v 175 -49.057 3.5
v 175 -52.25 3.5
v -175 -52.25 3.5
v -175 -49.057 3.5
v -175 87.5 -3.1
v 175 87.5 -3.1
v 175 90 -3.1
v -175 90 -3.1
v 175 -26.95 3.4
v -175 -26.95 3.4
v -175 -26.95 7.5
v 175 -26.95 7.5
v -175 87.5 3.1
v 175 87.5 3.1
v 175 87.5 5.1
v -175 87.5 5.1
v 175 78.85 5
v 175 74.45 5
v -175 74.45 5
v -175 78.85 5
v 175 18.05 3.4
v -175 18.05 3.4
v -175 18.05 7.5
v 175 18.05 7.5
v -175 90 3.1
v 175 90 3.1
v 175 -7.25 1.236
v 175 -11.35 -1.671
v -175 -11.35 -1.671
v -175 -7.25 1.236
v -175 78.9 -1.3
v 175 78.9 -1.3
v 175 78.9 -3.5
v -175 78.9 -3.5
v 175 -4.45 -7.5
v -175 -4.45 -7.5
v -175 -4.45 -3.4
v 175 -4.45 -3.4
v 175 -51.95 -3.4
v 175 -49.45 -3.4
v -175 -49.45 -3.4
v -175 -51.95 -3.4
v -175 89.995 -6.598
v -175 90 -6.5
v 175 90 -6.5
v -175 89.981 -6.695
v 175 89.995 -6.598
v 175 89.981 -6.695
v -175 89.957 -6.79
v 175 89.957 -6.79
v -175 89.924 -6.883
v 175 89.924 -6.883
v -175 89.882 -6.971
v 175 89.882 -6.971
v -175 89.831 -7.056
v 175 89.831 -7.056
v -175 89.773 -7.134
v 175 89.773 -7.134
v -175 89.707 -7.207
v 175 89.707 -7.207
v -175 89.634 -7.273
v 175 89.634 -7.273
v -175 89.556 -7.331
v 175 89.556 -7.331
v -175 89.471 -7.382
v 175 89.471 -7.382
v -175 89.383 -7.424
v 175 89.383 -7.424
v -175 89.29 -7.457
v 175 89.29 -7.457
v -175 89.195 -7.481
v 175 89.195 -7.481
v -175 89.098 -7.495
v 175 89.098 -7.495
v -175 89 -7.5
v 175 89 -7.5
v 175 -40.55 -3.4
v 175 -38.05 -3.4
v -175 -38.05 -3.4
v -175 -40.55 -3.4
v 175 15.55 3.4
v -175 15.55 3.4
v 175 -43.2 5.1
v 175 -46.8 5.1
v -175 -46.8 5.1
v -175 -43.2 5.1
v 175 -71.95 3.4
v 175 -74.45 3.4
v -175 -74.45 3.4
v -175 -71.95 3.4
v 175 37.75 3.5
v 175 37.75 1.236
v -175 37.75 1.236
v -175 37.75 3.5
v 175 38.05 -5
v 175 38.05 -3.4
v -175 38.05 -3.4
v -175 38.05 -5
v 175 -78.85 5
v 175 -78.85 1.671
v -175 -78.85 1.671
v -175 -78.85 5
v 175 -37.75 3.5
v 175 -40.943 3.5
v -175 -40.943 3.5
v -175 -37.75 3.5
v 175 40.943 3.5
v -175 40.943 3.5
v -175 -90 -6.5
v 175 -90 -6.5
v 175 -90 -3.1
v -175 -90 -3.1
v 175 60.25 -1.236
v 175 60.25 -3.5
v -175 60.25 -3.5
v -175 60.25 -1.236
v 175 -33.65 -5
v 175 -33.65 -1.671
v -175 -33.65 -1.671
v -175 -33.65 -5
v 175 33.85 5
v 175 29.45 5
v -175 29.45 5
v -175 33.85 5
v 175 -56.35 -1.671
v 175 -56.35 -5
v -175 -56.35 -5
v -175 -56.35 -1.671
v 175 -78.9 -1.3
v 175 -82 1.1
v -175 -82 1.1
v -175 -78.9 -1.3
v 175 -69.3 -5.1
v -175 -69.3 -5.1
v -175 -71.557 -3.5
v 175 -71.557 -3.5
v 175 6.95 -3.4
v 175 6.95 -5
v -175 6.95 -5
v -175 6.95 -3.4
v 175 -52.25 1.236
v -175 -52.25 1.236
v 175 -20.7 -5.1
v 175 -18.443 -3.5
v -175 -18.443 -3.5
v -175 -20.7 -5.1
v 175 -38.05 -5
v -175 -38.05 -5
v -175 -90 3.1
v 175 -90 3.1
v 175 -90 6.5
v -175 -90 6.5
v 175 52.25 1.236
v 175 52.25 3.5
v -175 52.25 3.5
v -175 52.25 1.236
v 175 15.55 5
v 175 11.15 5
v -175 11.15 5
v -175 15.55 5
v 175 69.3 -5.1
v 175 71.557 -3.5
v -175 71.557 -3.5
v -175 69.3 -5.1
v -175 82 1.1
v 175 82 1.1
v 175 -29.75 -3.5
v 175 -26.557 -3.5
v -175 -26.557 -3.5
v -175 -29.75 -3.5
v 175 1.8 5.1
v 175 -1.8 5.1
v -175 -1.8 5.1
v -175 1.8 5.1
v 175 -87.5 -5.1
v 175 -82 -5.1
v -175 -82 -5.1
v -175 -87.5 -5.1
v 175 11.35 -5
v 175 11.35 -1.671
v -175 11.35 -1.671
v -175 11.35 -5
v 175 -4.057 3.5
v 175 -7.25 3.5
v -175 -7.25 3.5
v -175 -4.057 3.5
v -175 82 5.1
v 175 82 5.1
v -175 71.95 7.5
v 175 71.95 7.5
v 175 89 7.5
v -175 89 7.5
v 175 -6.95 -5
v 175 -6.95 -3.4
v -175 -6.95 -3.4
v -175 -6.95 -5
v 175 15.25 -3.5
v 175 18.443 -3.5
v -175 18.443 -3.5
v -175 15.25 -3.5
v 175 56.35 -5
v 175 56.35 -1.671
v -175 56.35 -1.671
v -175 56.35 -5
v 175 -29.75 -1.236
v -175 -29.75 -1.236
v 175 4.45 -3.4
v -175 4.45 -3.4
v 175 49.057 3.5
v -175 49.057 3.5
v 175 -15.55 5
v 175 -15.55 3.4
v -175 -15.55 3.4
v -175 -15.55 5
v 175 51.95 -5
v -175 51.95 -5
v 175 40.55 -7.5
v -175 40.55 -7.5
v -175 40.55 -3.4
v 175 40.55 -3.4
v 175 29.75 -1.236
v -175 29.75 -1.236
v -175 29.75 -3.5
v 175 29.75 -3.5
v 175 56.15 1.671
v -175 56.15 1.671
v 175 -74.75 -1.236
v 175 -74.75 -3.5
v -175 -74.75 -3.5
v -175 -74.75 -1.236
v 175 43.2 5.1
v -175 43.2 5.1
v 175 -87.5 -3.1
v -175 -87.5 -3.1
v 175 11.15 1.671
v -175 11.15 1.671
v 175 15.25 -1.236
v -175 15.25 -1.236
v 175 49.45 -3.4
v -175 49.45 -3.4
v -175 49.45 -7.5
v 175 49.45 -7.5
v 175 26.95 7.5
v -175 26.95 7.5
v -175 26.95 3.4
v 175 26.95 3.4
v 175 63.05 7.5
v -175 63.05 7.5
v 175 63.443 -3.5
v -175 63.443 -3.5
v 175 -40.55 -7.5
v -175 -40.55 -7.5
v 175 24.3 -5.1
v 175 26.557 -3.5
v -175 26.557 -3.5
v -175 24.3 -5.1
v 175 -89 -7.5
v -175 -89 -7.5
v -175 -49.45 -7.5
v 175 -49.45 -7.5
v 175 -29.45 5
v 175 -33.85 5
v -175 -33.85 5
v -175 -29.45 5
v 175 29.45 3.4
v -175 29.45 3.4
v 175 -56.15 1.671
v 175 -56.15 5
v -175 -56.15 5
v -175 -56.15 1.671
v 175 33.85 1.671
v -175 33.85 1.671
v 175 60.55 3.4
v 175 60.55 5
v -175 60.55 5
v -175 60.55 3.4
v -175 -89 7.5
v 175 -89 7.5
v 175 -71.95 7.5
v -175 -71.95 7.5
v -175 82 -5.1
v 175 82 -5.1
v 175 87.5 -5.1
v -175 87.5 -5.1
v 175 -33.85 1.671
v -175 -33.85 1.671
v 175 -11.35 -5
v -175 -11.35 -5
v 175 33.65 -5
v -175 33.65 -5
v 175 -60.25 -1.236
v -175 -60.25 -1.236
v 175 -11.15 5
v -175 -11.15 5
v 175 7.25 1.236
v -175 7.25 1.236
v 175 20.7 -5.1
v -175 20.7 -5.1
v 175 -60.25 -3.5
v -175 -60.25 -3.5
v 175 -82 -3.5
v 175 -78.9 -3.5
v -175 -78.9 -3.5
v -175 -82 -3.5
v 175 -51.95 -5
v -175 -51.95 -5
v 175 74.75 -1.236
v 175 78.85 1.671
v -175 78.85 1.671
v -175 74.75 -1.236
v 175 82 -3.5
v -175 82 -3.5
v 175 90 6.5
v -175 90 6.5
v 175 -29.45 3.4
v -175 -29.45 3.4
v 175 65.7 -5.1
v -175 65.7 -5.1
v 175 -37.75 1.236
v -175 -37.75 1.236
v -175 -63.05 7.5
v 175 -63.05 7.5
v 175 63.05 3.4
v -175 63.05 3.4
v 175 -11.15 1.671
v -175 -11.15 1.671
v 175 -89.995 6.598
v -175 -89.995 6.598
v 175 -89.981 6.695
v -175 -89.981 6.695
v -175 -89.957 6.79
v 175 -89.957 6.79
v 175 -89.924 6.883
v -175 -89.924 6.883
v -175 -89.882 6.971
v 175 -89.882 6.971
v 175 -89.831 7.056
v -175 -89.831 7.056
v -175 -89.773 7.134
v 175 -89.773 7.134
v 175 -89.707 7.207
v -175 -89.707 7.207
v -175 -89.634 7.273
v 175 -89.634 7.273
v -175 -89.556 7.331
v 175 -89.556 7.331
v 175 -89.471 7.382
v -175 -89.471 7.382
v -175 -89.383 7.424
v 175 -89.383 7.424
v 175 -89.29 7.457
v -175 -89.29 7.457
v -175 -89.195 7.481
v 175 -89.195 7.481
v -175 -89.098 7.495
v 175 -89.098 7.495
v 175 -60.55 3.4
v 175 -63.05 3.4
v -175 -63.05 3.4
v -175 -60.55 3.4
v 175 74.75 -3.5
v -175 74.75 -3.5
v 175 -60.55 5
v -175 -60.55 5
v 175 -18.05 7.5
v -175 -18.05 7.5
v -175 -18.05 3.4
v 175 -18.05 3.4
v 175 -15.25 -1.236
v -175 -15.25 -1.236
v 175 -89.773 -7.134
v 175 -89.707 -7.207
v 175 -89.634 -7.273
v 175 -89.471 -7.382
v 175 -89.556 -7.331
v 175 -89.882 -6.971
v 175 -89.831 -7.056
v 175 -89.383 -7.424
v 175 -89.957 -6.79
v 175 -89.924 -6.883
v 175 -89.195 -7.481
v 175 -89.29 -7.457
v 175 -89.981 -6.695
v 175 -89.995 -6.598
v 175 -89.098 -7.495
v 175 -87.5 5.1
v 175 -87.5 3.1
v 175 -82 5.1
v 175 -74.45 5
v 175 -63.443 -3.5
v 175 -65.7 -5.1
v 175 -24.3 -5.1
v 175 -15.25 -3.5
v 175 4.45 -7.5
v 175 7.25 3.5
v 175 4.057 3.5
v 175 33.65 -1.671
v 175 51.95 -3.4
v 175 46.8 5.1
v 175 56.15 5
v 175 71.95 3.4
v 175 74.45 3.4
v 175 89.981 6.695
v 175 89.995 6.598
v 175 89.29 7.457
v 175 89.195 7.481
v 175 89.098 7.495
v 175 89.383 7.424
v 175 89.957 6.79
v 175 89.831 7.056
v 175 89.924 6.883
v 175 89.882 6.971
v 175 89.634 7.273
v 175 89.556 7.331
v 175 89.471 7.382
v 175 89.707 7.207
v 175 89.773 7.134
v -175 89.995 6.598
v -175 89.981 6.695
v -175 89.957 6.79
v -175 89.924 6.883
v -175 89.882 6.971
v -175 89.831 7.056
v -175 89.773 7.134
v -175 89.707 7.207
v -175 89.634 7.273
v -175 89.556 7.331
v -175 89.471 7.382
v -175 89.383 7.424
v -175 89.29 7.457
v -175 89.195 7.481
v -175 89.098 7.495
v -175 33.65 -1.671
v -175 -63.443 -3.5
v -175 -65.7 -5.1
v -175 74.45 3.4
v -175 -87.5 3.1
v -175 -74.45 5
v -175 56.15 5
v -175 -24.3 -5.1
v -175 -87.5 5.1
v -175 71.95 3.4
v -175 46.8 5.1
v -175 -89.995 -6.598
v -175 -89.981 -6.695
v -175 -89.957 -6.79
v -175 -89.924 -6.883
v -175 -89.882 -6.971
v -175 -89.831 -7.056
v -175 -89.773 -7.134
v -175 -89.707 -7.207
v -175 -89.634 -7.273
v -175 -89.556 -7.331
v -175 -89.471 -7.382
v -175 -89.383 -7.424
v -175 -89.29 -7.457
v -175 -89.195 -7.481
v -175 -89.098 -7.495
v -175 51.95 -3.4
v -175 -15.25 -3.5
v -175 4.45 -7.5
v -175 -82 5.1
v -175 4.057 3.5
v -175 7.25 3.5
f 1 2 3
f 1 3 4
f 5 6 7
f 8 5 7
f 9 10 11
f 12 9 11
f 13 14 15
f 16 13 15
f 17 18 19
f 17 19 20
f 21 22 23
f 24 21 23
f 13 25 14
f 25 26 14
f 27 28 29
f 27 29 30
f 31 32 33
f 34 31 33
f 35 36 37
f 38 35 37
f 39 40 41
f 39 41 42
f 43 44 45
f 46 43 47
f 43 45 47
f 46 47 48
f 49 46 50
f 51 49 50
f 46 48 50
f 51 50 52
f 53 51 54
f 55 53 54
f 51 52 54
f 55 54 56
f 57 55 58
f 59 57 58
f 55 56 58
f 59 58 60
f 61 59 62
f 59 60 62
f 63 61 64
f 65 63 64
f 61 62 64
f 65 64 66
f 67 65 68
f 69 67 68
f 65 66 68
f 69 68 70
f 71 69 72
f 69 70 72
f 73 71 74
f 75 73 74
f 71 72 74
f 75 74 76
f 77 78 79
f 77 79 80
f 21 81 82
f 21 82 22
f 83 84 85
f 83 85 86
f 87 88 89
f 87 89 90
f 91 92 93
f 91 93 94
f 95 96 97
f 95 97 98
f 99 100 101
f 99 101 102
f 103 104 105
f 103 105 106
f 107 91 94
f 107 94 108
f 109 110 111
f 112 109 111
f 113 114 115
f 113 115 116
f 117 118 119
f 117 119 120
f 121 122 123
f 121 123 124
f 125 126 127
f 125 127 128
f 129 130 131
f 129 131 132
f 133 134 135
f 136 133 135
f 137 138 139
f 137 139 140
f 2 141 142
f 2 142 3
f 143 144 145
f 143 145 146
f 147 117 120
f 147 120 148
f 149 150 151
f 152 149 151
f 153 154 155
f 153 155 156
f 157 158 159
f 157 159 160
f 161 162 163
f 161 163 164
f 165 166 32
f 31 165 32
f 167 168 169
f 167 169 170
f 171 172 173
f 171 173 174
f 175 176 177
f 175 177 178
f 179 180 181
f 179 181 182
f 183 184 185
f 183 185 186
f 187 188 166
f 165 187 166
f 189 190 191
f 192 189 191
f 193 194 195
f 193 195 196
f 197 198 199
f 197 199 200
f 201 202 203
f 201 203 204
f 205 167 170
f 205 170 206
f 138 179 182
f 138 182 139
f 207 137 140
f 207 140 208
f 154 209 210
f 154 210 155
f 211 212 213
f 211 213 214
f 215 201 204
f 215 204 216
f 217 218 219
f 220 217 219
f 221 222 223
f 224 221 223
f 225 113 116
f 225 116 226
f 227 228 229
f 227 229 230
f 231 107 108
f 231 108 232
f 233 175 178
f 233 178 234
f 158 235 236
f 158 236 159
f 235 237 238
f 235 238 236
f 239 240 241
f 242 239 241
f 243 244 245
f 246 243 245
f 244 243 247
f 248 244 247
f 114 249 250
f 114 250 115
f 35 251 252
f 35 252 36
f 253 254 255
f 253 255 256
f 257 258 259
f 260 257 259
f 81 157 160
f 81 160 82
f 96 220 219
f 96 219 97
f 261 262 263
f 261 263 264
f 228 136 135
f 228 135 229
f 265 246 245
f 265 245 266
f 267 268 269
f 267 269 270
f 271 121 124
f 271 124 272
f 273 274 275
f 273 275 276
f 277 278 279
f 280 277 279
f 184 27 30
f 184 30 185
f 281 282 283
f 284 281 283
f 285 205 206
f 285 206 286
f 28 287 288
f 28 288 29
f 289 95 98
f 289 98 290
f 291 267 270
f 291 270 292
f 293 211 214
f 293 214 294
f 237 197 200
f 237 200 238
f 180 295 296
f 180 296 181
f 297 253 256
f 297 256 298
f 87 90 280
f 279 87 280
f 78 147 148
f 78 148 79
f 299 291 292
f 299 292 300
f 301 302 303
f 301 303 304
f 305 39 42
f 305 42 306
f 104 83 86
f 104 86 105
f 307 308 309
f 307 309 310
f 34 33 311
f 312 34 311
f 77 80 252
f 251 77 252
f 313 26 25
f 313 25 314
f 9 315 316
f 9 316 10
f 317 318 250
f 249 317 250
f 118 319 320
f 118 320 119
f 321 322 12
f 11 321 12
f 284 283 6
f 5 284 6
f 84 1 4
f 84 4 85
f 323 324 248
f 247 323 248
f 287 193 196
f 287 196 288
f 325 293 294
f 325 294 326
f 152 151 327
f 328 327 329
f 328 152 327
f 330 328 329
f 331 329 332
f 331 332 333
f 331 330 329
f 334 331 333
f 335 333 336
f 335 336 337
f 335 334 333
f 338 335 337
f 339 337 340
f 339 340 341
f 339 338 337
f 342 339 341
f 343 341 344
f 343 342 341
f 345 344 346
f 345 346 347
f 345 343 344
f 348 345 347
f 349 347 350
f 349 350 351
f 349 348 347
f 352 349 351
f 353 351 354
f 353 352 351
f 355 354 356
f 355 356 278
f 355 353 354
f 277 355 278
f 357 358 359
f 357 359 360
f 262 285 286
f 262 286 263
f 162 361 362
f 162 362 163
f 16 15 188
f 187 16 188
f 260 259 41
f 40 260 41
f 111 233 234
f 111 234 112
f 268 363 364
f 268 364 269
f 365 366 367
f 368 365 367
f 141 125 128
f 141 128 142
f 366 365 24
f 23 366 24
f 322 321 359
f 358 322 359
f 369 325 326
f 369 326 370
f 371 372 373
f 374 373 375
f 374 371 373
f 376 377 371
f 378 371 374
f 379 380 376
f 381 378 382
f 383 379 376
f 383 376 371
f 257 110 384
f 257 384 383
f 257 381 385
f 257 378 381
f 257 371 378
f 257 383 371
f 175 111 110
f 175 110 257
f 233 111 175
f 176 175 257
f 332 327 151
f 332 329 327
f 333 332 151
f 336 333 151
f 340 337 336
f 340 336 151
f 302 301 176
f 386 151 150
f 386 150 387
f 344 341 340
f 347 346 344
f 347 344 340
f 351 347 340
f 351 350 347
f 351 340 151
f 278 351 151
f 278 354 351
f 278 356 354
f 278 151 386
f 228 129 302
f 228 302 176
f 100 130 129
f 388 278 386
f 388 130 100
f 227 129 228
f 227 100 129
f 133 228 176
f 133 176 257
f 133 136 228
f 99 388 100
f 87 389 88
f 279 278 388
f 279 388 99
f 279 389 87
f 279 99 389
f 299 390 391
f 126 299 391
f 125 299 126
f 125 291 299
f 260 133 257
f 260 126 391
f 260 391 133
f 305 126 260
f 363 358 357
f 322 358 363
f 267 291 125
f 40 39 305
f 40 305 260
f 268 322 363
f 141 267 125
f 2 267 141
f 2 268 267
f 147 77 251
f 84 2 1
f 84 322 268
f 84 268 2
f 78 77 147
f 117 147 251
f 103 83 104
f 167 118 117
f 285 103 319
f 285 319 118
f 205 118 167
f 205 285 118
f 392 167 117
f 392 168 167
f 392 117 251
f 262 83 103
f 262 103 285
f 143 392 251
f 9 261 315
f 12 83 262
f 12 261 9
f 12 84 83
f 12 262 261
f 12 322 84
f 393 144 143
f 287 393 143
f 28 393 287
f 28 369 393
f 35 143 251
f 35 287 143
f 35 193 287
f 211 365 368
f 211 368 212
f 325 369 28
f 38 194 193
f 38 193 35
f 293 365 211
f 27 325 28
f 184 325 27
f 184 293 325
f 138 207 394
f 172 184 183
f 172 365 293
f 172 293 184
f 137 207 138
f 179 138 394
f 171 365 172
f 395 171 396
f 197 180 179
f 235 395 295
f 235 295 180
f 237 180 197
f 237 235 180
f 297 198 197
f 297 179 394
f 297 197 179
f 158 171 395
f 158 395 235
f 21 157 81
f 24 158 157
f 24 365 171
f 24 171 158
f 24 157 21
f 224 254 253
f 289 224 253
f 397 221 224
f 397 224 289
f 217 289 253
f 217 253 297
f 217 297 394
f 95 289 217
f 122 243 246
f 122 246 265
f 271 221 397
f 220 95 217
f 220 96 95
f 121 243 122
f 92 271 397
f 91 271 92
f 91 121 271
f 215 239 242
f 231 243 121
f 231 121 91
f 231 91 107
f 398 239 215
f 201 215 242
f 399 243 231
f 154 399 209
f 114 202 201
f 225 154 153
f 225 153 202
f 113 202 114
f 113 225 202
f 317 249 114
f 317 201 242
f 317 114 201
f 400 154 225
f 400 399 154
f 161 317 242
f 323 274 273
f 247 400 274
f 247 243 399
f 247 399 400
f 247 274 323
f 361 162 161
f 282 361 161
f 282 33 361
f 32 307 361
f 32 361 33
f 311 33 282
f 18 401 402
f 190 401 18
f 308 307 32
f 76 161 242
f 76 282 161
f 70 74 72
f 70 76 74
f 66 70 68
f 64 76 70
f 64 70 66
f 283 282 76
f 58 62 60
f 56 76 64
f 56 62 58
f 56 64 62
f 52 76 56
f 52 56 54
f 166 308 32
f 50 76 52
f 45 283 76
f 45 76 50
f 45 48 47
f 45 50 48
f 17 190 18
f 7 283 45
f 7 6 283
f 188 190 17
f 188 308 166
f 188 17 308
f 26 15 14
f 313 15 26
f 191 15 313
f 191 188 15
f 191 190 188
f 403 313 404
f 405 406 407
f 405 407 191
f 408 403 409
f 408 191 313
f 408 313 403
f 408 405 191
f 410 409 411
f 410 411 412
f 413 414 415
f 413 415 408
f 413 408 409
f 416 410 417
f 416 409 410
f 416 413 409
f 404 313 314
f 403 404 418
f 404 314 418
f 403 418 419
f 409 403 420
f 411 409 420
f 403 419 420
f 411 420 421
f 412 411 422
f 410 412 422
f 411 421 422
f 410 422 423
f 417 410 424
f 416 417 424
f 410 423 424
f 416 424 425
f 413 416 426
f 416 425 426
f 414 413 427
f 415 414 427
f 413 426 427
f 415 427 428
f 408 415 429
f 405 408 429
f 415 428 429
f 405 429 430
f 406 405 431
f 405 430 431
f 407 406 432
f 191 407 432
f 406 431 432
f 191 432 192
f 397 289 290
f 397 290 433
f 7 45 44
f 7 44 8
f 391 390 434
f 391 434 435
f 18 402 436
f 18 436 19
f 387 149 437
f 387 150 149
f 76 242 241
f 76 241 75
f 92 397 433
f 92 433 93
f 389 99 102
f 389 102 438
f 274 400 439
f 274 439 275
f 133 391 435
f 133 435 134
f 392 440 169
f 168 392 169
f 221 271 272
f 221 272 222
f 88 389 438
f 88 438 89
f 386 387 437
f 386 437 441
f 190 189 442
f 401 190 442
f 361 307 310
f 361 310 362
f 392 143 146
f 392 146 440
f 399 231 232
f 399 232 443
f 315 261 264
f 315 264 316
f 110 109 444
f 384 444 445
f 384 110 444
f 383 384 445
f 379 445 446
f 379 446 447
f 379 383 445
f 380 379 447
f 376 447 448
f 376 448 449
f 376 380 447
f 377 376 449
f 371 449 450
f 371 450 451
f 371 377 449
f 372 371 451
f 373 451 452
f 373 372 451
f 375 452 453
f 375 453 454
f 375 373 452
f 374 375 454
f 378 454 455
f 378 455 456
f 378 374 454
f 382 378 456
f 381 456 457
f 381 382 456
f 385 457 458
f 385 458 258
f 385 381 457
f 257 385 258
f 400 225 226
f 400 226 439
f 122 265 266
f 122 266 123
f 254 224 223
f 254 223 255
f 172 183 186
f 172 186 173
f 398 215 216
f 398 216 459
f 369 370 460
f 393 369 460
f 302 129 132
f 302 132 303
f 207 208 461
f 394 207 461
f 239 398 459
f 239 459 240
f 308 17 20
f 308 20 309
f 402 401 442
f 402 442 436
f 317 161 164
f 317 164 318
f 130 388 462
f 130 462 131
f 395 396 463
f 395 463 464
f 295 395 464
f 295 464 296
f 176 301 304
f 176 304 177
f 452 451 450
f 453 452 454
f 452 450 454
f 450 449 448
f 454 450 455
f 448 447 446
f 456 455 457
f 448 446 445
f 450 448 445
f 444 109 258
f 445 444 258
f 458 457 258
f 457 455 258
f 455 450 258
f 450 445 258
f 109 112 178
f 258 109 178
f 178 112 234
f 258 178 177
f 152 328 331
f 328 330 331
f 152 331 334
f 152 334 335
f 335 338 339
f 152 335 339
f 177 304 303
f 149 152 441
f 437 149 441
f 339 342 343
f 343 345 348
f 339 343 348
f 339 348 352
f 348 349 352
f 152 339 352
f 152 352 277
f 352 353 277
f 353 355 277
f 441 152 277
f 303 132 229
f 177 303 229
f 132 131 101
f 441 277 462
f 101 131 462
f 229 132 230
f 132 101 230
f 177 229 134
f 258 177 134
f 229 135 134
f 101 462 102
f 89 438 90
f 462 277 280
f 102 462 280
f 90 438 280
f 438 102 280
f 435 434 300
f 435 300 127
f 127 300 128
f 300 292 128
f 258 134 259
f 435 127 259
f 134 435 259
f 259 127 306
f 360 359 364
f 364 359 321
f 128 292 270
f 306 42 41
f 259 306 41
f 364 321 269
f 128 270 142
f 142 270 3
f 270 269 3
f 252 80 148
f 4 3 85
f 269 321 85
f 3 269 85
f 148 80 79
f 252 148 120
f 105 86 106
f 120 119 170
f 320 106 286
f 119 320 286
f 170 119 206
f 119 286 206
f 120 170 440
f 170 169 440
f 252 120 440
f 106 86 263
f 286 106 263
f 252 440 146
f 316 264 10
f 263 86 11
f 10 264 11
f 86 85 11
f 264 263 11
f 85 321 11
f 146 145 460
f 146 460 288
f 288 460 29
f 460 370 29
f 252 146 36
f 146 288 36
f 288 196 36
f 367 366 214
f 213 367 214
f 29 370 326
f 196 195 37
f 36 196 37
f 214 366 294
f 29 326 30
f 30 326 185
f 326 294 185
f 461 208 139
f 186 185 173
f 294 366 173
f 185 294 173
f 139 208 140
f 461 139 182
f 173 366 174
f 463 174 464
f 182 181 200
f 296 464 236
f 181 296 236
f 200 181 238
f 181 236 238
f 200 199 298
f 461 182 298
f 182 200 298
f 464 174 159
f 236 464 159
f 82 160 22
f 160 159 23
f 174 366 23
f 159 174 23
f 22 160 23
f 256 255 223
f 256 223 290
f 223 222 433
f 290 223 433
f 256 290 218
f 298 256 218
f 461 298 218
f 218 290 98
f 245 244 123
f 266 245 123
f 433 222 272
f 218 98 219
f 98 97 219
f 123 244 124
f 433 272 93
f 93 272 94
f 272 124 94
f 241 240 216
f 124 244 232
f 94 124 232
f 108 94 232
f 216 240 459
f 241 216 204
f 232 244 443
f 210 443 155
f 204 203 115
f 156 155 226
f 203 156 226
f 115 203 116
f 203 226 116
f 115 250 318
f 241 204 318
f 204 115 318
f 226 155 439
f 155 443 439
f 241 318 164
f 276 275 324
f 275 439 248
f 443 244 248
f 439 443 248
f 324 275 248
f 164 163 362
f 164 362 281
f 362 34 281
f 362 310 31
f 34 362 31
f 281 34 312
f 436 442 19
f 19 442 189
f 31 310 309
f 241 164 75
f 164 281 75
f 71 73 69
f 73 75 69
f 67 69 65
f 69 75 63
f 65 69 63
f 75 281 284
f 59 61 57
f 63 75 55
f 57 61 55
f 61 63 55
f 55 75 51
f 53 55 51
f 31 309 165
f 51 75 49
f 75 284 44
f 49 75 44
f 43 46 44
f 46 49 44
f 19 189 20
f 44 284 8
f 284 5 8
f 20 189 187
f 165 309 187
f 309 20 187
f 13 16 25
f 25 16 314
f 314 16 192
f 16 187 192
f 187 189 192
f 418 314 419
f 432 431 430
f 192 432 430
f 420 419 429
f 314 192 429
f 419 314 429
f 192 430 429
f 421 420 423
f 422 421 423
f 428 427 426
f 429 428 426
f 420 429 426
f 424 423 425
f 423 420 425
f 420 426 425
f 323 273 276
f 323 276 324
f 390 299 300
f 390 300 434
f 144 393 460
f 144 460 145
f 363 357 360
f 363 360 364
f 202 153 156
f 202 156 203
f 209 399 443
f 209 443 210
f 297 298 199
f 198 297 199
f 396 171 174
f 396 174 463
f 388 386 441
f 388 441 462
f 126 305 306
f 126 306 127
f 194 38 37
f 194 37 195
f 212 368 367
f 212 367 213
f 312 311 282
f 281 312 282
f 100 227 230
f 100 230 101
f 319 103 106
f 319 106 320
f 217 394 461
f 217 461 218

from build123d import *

# Parameters (mm, degrees)
PAD002_DEPTH            = 200
BODY002_PLACEMENT_ANGLE = 180
ARRAY001_Y_COUNT        = 4
ARRAY001_Y_PITCH        = 45
PAD001_DEPTH            = 200
ARRAY_Y_COUNT           = 3
ARRAY_Y_PITCH           = 45
PAD003_DEPTH            = 200
SKETCH_W                = 180
SKETCH_H                = 15
PAD_DEPTH               = 175
FILLET_R                = 1


with BuildPart() as array001:
    # Sketch002 → Pad002 (new body, symmetric)
    with BuildSketch(Plane.YZ):
        Polygon((-4.45, -8), (-4.45, -3.4), (-6.95, -3.4), (-6.95, -5), (-11.35, -5), (-11.35, -1.670587), (-7.25, 1.236157), (-7.25, 3.5), (-4.05682, 3.5), (-1.8, 5.1), (1.8, 5.1), (4.05682, 3.5), (7.25, 3.5), (7.25, 1.236157), (11.35, -1.670587), (11.35, -5), (6.95, -5), (6.95, -3.4), (4.45, -3.4), (4.45, -8), align=None)
    extrude(amount=PAD002_DEPTH, both=True)


with BuildPart() as array001_1:
    # Body002 placement: moved
    add(array001.part.moved(Location((0, -67.5, 0))).rotate(Axis((0, -67.5, 0), (1, 0, 0)), BODY002_PLACEMENT_ANGLE))

    # Array001 Y: Array001 ×4


with BuildPart() as array001_2:
    add(array001_1.part)
    with Locations(*[(0, i * ARRAY001_Y_PITCH, 0) for i in range(1, ARRAY001_Y_COUNT)]):
        add(array001_1.part)


with BuildPart() as array:
    # Sketch001 → Pad001 (new body, symmetric)
    with BuildSketch(Plane.YZ):
        Polygon((-4.45, -8), (-4.45, -3.4), (-6.95, -3.4), (-6.95, -5), (-11.35, -5), (-11.35, -1.670587), (-7.25, 1.236157), (-7.25, 3.5), (-4.05682, 3.5), (-1.8, 5.1), (1.8, 5.1), (4.05682, 3.5), (7.25, 3.5), (7.25, 1.236157), (11.35, -1.670587), (11.35, -5), (6.95, -5), (6.95, -3.4), (4.45, -3.4), (4.45, -8), align=None)
    extrude(amount=PAD001_DEPTH, both=True)


with BuildPart() as array_1:
    # Body001 placement: moved
    add(array.part.moved(Location((0, -45, 0))))

    # Array Y: Array ×3


with BuildPart() as array_2:
    add(array_1.part)
    with Locations(*[(0, i * ARRAY_Y_PITCH, 0) for i in range(1, ARRAY_Y_COUNT)]):
        add(array_1.part)


with BuildPart() as body003:
    # Sketch003 → Pad003 (new body, symmetric)
    with BuildSketch(Plane.YZ):
        Polygon((-90.5, 3.1), (-87.5, 3.1), (-87.5, 5.1), (-82, 5.1), (-82, 1.1), (-78.9, -1.3), (-78.9, -3.5), (-82, -3.5), (-82, -5.1), (-87.5, -5.1), (-87.5, -3.1), (-90.5, -3.1), align=None)
    extrude(amount=PAD003_DEPTH, both=True)


with BuildPart() as fusion:
    # Part__Mirroring: instance of Body003
    add(body003.part.mirror(Plane(origin=(0, 0, 0), x_dir=(1, 0, 0), z_dir=(0, 1, 0))))

    # Fusion: union Body003
    add(body003.part)


with BuildPart() as cut002:
    # Sketch → Pad (new body, symmetric)
    with BuildSketch(Plane.YZ):
        Rectangle(SKETCH_W, SKETCH_H)
    extrude(amount=PAD_DEPTH, both=True)

    # Fillet
    fillet_edges = [cut002.edges().sort_by_distance(p)[0] for p in [
        (0, -90, 7.5),
        (0, -90, -7.5),
        (0, 90, 7.5),
        (0, 90, -7.5),
    ]]
    fillet(fillet_edges, radius=FILLET_R)

    # Cut: cut Fusion
    add(fusion.part, mode=Mode.SUBTRACT)

    # Cut001: cut Array
    add(array_2.part, mode=Mode.SUBTRACT)

    # Cut002: cut Array001
    add(array001_2.part, mode=Mode.SUBTRACT)


solid = cut002.part
